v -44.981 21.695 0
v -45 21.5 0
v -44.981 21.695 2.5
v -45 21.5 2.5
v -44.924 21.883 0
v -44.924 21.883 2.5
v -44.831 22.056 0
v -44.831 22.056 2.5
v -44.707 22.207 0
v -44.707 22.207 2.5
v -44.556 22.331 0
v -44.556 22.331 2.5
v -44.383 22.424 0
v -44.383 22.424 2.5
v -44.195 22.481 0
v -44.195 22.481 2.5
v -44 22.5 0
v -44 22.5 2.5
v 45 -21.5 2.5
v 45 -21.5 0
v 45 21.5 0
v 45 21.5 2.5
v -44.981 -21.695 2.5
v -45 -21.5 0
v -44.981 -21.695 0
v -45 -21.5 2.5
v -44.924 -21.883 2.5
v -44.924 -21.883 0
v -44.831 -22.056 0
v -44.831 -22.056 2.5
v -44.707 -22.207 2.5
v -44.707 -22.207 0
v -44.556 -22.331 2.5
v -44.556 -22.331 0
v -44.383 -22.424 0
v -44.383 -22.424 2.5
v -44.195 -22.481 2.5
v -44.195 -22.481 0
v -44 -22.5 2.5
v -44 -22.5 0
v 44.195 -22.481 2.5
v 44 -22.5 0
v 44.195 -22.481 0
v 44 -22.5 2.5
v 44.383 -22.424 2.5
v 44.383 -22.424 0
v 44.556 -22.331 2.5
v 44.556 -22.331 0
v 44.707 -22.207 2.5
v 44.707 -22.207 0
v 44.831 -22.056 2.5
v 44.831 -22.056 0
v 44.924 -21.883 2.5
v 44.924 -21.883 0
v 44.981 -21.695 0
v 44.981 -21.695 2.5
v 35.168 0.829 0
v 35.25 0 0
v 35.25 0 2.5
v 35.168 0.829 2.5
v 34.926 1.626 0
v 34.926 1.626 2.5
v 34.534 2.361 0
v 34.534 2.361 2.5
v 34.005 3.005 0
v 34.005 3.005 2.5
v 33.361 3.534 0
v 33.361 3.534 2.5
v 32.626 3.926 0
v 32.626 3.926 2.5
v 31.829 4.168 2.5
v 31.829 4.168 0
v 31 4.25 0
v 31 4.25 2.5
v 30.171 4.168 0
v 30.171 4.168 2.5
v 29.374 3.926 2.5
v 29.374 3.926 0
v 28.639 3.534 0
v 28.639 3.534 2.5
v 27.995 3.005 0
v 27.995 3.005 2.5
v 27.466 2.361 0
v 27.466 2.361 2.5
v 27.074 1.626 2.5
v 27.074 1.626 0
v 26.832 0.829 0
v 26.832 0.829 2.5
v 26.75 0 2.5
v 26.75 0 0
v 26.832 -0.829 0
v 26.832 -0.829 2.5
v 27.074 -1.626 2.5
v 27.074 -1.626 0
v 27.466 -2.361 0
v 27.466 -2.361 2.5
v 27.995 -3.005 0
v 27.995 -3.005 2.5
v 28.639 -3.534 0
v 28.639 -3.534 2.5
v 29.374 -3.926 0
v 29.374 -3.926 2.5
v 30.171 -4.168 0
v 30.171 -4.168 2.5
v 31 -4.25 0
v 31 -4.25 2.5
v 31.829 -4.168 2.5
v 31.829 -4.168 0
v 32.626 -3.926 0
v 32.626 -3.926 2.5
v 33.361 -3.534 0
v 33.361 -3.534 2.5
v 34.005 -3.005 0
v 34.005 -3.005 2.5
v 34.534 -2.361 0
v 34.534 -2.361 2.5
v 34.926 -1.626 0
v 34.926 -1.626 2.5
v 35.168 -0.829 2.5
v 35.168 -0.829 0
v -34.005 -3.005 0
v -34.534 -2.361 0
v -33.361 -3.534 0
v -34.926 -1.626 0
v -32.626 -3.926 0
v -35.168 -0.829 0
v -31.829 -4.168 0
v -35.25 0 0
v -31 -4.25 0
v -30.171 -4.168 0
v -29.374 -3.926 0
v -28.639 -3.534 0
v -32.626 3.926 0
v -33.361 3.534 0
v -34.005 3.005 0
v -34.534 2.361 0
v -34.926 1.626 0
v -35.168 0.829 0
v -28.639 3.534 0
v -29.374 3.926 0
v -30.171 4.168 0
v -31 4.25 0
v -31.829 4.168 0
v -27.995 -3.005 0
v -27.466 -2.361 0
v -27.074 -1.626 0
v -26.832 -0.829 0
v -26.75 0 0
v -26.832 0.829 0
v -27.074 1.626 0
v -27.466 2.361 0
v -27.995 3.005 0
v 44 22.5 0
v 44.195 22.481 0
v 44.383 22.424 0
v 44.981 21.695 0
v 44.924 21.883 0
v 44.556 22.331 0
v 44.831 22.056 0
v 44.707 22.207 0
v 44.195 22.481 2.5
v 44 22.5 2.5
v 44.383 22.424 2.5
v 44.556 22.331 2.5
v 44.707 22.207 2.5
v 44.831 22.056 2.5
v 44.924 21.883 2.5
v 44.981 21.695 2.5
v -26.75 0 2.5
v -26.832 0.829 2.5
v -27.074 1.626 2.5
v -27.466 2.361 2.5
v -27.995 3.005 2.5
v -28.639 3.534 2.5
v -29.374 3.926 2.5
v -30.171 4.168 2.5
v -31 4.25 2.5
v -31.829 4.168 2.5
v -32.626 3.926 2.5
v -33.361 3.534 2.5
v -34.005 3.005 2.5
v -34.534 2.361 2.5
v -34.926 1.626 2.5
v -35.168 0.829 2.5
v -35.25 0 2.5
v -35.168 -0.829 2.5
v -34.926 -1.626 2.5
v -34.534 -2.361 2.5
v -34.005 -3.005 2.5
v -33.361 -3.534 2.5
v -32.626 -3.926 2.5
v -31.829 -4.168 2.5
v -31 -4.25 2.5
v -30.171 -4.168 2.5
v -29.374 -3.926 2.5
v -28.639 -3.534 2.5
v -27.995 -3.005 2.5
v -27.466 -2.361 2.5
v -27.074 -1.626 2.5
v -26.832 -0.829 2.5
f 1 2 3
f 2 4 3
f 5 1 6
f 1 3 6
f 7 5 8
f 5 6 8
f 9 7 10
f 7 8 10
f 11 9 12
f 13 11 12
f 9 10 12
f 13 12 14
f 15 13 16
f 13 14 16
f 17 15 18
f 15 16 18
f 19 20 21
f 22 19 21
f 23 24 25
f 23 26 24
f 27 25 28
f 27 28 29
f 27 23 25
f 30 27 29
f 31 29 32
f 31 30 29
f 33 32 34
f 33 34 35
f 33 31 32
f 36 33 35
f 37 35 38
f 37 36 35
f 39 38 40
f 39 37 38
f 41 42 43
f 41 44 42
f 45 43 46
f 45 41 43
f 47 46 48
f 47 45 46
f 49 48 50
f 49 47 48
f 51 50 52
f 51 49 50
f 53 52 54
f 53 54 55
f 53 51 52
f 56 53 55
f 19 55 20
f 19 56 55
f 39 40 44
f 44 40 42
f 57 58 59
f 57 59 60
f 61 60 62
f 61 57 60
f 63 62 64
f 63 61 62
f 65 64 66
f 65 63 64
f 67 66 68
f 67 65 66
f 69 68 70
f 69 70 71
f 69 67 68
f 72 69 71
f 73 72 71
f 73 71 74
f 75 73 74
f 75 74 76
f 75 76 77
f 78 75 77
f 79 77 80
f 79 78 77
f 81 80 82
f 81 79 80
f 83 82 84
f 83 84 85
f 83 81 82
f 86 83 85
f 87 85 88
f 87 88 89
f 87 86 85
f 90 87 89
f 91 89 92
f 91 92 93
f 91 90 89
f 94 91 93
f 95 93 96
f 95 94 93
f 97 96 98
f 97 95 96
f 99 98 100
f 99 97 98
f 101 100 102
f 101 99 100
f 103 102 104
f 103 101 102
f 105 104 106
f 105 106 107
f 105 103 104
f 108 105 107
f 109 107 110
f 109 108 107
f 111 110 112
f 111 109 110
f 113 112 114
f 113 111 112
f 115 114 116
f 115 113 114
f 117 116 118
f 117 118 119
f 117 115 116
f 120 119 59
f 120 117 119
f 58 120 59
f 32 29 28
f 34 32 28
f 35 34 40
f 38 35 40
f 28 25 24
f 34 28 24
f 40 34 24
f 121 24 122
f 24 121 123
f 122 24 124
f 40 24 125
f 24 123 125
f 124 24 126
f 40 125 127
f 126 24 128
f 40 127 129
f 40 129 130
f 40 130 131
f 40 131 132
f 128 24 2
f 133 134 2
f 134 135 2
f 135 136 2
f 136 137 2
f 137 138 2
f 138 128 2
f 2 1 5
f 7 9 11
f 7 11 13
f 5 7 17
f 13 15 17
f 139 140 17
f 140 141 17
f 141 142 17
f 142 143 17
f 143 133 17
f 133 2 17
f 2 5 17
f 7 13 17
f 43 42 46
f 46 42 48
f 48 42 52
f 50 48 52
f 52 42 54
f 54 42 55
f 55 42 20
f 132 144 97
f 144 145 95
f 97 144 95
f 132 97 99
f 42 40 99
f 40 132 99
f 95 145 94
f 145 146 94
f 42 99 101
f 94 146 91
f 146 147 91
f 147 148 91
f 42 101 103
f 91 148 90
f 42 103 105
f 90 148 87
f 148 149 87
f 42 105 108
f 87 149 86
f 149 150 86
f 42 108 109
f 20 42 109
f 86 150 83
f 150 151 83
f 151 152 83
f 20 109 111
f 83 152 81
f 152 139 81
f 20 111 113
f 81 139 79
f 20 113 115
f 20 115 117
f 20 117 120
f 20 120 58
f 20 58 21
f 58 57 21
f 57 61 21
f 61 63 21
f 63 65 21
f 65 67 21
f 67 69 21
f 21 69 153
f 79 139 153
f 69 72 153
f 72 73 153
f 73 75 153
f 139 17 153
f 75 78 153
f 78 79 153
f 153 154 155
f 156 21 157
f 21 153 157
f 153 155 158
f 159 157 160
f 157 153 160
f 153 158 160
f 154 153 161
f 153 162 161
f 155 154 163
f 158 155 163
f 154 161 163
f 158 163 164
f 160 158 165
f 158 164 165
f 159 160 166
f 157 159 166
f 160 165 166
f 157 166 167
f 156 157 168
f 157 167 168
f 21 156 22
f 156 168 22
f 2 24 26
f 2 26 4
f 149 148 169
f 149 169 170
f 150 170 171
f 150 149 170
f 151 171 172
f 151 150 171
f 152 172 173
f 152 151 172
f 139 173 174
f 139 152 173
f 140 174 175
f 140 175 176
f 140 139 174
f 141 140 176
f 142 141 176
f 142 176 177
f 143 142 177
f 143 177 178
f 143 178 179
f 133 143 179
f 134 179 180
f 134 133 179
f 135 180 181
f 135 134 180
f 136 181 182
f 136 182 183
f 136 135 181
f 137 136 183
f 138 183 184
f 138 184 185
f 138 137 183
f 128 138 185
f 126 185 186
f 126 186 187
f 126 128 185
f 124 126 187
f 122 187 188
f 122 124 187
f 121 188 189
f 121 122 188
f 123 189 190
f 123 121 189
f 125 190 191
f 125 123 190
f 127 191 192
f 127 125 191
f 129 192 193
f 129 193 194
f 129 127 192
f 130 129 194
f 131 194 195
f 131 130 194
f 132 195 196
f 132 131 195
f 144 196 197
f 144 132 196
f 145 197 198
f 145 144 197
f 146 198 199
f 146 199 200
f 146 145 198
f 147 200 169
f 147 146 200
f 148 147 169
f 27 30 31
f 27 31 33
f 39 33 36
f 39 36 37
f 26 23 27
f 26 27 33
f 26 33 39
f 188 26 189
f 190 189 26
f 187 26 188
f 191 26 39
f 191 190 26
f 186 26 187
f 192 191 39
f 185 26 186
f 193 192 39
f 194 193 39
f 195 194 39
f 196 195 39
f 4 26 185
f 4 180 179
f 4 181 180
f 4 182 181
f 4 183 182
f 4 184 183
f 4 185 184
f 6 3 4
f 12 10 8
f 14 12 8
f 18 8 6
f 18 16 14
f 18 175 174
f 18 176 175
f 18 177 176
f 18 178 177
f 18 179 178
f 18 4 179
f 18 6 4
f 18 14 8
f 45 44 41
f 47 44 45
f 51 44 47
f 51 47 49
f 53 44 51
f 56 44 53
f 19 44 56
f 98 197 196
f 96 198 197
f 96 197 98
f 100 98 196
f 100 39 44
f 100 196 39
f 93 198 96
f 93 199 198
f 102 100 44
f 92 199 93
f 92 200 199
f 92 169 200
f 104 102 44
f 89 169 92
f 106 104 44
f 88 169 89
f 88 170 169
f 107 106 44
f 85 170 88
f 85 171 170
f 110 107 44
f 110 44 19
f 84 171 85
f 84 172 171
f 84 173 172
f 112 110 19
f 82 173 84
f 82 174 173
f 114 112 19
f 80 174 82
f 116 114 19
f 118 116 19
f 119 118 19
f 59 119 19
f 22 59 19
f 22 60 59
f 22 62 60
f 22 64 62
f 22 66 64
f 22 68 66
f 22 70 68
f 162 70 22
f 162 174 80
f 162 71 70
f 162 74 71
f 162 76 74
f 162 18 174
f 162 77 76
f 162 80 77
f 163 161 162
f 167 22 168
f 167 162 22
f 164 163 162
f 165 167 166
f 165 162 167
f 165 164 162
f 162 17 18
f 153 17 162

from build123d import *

# Parameters (mm, degrees)
SKETCH_1_W      = 90
SKETCH_1_H      = 45
SKETCH_1_R      = 4.25
EXTRUDE_1_DEPTH = 2.5
FILLET_1_R      = 1


with BuildPart() as part:
    # Эскиз1 → Бобышка-Вытянуть1 (new body)
    with BuildSketch(Plane.XY):
        Rectangle(SKETCH_1_W, SKETCH_1_H)
        with Locations((-31, 0)):
            Circle(SKETCH_1_R, mode=Mode.SUBTRACT)
        with Locations((31, 0)):
            Circle(SKETCH_1_R, mode=Mode.SUBTRACT)
    extrude(amount=EXTRUDE_1_DEPTH)

    # Скругление1
    fillet_1_edges = [part.edges().sort_by_distance(p)[0] for p in [
        (45, -22.5, 1.25),
        (-45, -22.5, 1.25),
        (-45, 22.5, 1.25),
        (45, 22.5, 1.25),
    ]]
    fillet(fillet_1_edges, radius=FILLET_1_R)


solid = part.part
